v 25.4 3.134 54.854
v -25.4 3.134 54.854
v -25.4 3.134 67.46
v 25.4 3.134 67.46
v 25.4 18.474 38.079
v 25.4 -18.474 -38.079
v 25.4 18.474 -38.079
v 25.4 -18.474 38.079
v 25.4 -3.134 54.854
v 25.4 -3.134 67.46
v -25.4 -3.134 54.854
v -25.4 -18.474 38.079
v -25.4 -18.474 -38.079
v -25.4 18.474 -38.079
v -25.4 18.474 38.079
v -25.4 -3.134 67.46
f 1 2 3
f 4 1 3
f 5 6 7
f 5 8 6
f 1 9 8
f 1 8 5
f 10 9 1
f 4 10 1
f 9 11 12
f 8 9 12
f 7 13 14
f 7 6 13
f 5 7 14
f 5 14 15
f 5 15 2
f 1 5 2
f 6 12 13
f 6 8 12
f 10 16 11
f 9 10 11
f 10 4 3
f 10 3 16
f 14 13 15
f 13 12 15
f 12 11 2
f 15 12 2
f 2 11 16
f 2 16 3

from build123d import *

# Parameters (mm, degrees)
F1_DEPTH      = 25.4
F1_DEPTH_BACK = 25.4


with BuildPart() as f1:
    # F0 (on Right) → F1 (new body, two sides)
    with BuildSketch(Plane.YZ) as f1_sk:
        Polygon((-18.474095, -38.079124), (18.474095, -38.079124), (18.474095, 38.079124), (3.134074, 54.85357), (3.134074, 67.459583), (0, 67.459583), (-3.134074, 67.459583), (-3.134074, 54.85357), (-18.474095, 38.079124), align=None)
    extrude(amount=F1_DEPTH)
    extrude(f1_sk.sketch, amount=-F1_DEPTH_BACK)


solid = f1.part
